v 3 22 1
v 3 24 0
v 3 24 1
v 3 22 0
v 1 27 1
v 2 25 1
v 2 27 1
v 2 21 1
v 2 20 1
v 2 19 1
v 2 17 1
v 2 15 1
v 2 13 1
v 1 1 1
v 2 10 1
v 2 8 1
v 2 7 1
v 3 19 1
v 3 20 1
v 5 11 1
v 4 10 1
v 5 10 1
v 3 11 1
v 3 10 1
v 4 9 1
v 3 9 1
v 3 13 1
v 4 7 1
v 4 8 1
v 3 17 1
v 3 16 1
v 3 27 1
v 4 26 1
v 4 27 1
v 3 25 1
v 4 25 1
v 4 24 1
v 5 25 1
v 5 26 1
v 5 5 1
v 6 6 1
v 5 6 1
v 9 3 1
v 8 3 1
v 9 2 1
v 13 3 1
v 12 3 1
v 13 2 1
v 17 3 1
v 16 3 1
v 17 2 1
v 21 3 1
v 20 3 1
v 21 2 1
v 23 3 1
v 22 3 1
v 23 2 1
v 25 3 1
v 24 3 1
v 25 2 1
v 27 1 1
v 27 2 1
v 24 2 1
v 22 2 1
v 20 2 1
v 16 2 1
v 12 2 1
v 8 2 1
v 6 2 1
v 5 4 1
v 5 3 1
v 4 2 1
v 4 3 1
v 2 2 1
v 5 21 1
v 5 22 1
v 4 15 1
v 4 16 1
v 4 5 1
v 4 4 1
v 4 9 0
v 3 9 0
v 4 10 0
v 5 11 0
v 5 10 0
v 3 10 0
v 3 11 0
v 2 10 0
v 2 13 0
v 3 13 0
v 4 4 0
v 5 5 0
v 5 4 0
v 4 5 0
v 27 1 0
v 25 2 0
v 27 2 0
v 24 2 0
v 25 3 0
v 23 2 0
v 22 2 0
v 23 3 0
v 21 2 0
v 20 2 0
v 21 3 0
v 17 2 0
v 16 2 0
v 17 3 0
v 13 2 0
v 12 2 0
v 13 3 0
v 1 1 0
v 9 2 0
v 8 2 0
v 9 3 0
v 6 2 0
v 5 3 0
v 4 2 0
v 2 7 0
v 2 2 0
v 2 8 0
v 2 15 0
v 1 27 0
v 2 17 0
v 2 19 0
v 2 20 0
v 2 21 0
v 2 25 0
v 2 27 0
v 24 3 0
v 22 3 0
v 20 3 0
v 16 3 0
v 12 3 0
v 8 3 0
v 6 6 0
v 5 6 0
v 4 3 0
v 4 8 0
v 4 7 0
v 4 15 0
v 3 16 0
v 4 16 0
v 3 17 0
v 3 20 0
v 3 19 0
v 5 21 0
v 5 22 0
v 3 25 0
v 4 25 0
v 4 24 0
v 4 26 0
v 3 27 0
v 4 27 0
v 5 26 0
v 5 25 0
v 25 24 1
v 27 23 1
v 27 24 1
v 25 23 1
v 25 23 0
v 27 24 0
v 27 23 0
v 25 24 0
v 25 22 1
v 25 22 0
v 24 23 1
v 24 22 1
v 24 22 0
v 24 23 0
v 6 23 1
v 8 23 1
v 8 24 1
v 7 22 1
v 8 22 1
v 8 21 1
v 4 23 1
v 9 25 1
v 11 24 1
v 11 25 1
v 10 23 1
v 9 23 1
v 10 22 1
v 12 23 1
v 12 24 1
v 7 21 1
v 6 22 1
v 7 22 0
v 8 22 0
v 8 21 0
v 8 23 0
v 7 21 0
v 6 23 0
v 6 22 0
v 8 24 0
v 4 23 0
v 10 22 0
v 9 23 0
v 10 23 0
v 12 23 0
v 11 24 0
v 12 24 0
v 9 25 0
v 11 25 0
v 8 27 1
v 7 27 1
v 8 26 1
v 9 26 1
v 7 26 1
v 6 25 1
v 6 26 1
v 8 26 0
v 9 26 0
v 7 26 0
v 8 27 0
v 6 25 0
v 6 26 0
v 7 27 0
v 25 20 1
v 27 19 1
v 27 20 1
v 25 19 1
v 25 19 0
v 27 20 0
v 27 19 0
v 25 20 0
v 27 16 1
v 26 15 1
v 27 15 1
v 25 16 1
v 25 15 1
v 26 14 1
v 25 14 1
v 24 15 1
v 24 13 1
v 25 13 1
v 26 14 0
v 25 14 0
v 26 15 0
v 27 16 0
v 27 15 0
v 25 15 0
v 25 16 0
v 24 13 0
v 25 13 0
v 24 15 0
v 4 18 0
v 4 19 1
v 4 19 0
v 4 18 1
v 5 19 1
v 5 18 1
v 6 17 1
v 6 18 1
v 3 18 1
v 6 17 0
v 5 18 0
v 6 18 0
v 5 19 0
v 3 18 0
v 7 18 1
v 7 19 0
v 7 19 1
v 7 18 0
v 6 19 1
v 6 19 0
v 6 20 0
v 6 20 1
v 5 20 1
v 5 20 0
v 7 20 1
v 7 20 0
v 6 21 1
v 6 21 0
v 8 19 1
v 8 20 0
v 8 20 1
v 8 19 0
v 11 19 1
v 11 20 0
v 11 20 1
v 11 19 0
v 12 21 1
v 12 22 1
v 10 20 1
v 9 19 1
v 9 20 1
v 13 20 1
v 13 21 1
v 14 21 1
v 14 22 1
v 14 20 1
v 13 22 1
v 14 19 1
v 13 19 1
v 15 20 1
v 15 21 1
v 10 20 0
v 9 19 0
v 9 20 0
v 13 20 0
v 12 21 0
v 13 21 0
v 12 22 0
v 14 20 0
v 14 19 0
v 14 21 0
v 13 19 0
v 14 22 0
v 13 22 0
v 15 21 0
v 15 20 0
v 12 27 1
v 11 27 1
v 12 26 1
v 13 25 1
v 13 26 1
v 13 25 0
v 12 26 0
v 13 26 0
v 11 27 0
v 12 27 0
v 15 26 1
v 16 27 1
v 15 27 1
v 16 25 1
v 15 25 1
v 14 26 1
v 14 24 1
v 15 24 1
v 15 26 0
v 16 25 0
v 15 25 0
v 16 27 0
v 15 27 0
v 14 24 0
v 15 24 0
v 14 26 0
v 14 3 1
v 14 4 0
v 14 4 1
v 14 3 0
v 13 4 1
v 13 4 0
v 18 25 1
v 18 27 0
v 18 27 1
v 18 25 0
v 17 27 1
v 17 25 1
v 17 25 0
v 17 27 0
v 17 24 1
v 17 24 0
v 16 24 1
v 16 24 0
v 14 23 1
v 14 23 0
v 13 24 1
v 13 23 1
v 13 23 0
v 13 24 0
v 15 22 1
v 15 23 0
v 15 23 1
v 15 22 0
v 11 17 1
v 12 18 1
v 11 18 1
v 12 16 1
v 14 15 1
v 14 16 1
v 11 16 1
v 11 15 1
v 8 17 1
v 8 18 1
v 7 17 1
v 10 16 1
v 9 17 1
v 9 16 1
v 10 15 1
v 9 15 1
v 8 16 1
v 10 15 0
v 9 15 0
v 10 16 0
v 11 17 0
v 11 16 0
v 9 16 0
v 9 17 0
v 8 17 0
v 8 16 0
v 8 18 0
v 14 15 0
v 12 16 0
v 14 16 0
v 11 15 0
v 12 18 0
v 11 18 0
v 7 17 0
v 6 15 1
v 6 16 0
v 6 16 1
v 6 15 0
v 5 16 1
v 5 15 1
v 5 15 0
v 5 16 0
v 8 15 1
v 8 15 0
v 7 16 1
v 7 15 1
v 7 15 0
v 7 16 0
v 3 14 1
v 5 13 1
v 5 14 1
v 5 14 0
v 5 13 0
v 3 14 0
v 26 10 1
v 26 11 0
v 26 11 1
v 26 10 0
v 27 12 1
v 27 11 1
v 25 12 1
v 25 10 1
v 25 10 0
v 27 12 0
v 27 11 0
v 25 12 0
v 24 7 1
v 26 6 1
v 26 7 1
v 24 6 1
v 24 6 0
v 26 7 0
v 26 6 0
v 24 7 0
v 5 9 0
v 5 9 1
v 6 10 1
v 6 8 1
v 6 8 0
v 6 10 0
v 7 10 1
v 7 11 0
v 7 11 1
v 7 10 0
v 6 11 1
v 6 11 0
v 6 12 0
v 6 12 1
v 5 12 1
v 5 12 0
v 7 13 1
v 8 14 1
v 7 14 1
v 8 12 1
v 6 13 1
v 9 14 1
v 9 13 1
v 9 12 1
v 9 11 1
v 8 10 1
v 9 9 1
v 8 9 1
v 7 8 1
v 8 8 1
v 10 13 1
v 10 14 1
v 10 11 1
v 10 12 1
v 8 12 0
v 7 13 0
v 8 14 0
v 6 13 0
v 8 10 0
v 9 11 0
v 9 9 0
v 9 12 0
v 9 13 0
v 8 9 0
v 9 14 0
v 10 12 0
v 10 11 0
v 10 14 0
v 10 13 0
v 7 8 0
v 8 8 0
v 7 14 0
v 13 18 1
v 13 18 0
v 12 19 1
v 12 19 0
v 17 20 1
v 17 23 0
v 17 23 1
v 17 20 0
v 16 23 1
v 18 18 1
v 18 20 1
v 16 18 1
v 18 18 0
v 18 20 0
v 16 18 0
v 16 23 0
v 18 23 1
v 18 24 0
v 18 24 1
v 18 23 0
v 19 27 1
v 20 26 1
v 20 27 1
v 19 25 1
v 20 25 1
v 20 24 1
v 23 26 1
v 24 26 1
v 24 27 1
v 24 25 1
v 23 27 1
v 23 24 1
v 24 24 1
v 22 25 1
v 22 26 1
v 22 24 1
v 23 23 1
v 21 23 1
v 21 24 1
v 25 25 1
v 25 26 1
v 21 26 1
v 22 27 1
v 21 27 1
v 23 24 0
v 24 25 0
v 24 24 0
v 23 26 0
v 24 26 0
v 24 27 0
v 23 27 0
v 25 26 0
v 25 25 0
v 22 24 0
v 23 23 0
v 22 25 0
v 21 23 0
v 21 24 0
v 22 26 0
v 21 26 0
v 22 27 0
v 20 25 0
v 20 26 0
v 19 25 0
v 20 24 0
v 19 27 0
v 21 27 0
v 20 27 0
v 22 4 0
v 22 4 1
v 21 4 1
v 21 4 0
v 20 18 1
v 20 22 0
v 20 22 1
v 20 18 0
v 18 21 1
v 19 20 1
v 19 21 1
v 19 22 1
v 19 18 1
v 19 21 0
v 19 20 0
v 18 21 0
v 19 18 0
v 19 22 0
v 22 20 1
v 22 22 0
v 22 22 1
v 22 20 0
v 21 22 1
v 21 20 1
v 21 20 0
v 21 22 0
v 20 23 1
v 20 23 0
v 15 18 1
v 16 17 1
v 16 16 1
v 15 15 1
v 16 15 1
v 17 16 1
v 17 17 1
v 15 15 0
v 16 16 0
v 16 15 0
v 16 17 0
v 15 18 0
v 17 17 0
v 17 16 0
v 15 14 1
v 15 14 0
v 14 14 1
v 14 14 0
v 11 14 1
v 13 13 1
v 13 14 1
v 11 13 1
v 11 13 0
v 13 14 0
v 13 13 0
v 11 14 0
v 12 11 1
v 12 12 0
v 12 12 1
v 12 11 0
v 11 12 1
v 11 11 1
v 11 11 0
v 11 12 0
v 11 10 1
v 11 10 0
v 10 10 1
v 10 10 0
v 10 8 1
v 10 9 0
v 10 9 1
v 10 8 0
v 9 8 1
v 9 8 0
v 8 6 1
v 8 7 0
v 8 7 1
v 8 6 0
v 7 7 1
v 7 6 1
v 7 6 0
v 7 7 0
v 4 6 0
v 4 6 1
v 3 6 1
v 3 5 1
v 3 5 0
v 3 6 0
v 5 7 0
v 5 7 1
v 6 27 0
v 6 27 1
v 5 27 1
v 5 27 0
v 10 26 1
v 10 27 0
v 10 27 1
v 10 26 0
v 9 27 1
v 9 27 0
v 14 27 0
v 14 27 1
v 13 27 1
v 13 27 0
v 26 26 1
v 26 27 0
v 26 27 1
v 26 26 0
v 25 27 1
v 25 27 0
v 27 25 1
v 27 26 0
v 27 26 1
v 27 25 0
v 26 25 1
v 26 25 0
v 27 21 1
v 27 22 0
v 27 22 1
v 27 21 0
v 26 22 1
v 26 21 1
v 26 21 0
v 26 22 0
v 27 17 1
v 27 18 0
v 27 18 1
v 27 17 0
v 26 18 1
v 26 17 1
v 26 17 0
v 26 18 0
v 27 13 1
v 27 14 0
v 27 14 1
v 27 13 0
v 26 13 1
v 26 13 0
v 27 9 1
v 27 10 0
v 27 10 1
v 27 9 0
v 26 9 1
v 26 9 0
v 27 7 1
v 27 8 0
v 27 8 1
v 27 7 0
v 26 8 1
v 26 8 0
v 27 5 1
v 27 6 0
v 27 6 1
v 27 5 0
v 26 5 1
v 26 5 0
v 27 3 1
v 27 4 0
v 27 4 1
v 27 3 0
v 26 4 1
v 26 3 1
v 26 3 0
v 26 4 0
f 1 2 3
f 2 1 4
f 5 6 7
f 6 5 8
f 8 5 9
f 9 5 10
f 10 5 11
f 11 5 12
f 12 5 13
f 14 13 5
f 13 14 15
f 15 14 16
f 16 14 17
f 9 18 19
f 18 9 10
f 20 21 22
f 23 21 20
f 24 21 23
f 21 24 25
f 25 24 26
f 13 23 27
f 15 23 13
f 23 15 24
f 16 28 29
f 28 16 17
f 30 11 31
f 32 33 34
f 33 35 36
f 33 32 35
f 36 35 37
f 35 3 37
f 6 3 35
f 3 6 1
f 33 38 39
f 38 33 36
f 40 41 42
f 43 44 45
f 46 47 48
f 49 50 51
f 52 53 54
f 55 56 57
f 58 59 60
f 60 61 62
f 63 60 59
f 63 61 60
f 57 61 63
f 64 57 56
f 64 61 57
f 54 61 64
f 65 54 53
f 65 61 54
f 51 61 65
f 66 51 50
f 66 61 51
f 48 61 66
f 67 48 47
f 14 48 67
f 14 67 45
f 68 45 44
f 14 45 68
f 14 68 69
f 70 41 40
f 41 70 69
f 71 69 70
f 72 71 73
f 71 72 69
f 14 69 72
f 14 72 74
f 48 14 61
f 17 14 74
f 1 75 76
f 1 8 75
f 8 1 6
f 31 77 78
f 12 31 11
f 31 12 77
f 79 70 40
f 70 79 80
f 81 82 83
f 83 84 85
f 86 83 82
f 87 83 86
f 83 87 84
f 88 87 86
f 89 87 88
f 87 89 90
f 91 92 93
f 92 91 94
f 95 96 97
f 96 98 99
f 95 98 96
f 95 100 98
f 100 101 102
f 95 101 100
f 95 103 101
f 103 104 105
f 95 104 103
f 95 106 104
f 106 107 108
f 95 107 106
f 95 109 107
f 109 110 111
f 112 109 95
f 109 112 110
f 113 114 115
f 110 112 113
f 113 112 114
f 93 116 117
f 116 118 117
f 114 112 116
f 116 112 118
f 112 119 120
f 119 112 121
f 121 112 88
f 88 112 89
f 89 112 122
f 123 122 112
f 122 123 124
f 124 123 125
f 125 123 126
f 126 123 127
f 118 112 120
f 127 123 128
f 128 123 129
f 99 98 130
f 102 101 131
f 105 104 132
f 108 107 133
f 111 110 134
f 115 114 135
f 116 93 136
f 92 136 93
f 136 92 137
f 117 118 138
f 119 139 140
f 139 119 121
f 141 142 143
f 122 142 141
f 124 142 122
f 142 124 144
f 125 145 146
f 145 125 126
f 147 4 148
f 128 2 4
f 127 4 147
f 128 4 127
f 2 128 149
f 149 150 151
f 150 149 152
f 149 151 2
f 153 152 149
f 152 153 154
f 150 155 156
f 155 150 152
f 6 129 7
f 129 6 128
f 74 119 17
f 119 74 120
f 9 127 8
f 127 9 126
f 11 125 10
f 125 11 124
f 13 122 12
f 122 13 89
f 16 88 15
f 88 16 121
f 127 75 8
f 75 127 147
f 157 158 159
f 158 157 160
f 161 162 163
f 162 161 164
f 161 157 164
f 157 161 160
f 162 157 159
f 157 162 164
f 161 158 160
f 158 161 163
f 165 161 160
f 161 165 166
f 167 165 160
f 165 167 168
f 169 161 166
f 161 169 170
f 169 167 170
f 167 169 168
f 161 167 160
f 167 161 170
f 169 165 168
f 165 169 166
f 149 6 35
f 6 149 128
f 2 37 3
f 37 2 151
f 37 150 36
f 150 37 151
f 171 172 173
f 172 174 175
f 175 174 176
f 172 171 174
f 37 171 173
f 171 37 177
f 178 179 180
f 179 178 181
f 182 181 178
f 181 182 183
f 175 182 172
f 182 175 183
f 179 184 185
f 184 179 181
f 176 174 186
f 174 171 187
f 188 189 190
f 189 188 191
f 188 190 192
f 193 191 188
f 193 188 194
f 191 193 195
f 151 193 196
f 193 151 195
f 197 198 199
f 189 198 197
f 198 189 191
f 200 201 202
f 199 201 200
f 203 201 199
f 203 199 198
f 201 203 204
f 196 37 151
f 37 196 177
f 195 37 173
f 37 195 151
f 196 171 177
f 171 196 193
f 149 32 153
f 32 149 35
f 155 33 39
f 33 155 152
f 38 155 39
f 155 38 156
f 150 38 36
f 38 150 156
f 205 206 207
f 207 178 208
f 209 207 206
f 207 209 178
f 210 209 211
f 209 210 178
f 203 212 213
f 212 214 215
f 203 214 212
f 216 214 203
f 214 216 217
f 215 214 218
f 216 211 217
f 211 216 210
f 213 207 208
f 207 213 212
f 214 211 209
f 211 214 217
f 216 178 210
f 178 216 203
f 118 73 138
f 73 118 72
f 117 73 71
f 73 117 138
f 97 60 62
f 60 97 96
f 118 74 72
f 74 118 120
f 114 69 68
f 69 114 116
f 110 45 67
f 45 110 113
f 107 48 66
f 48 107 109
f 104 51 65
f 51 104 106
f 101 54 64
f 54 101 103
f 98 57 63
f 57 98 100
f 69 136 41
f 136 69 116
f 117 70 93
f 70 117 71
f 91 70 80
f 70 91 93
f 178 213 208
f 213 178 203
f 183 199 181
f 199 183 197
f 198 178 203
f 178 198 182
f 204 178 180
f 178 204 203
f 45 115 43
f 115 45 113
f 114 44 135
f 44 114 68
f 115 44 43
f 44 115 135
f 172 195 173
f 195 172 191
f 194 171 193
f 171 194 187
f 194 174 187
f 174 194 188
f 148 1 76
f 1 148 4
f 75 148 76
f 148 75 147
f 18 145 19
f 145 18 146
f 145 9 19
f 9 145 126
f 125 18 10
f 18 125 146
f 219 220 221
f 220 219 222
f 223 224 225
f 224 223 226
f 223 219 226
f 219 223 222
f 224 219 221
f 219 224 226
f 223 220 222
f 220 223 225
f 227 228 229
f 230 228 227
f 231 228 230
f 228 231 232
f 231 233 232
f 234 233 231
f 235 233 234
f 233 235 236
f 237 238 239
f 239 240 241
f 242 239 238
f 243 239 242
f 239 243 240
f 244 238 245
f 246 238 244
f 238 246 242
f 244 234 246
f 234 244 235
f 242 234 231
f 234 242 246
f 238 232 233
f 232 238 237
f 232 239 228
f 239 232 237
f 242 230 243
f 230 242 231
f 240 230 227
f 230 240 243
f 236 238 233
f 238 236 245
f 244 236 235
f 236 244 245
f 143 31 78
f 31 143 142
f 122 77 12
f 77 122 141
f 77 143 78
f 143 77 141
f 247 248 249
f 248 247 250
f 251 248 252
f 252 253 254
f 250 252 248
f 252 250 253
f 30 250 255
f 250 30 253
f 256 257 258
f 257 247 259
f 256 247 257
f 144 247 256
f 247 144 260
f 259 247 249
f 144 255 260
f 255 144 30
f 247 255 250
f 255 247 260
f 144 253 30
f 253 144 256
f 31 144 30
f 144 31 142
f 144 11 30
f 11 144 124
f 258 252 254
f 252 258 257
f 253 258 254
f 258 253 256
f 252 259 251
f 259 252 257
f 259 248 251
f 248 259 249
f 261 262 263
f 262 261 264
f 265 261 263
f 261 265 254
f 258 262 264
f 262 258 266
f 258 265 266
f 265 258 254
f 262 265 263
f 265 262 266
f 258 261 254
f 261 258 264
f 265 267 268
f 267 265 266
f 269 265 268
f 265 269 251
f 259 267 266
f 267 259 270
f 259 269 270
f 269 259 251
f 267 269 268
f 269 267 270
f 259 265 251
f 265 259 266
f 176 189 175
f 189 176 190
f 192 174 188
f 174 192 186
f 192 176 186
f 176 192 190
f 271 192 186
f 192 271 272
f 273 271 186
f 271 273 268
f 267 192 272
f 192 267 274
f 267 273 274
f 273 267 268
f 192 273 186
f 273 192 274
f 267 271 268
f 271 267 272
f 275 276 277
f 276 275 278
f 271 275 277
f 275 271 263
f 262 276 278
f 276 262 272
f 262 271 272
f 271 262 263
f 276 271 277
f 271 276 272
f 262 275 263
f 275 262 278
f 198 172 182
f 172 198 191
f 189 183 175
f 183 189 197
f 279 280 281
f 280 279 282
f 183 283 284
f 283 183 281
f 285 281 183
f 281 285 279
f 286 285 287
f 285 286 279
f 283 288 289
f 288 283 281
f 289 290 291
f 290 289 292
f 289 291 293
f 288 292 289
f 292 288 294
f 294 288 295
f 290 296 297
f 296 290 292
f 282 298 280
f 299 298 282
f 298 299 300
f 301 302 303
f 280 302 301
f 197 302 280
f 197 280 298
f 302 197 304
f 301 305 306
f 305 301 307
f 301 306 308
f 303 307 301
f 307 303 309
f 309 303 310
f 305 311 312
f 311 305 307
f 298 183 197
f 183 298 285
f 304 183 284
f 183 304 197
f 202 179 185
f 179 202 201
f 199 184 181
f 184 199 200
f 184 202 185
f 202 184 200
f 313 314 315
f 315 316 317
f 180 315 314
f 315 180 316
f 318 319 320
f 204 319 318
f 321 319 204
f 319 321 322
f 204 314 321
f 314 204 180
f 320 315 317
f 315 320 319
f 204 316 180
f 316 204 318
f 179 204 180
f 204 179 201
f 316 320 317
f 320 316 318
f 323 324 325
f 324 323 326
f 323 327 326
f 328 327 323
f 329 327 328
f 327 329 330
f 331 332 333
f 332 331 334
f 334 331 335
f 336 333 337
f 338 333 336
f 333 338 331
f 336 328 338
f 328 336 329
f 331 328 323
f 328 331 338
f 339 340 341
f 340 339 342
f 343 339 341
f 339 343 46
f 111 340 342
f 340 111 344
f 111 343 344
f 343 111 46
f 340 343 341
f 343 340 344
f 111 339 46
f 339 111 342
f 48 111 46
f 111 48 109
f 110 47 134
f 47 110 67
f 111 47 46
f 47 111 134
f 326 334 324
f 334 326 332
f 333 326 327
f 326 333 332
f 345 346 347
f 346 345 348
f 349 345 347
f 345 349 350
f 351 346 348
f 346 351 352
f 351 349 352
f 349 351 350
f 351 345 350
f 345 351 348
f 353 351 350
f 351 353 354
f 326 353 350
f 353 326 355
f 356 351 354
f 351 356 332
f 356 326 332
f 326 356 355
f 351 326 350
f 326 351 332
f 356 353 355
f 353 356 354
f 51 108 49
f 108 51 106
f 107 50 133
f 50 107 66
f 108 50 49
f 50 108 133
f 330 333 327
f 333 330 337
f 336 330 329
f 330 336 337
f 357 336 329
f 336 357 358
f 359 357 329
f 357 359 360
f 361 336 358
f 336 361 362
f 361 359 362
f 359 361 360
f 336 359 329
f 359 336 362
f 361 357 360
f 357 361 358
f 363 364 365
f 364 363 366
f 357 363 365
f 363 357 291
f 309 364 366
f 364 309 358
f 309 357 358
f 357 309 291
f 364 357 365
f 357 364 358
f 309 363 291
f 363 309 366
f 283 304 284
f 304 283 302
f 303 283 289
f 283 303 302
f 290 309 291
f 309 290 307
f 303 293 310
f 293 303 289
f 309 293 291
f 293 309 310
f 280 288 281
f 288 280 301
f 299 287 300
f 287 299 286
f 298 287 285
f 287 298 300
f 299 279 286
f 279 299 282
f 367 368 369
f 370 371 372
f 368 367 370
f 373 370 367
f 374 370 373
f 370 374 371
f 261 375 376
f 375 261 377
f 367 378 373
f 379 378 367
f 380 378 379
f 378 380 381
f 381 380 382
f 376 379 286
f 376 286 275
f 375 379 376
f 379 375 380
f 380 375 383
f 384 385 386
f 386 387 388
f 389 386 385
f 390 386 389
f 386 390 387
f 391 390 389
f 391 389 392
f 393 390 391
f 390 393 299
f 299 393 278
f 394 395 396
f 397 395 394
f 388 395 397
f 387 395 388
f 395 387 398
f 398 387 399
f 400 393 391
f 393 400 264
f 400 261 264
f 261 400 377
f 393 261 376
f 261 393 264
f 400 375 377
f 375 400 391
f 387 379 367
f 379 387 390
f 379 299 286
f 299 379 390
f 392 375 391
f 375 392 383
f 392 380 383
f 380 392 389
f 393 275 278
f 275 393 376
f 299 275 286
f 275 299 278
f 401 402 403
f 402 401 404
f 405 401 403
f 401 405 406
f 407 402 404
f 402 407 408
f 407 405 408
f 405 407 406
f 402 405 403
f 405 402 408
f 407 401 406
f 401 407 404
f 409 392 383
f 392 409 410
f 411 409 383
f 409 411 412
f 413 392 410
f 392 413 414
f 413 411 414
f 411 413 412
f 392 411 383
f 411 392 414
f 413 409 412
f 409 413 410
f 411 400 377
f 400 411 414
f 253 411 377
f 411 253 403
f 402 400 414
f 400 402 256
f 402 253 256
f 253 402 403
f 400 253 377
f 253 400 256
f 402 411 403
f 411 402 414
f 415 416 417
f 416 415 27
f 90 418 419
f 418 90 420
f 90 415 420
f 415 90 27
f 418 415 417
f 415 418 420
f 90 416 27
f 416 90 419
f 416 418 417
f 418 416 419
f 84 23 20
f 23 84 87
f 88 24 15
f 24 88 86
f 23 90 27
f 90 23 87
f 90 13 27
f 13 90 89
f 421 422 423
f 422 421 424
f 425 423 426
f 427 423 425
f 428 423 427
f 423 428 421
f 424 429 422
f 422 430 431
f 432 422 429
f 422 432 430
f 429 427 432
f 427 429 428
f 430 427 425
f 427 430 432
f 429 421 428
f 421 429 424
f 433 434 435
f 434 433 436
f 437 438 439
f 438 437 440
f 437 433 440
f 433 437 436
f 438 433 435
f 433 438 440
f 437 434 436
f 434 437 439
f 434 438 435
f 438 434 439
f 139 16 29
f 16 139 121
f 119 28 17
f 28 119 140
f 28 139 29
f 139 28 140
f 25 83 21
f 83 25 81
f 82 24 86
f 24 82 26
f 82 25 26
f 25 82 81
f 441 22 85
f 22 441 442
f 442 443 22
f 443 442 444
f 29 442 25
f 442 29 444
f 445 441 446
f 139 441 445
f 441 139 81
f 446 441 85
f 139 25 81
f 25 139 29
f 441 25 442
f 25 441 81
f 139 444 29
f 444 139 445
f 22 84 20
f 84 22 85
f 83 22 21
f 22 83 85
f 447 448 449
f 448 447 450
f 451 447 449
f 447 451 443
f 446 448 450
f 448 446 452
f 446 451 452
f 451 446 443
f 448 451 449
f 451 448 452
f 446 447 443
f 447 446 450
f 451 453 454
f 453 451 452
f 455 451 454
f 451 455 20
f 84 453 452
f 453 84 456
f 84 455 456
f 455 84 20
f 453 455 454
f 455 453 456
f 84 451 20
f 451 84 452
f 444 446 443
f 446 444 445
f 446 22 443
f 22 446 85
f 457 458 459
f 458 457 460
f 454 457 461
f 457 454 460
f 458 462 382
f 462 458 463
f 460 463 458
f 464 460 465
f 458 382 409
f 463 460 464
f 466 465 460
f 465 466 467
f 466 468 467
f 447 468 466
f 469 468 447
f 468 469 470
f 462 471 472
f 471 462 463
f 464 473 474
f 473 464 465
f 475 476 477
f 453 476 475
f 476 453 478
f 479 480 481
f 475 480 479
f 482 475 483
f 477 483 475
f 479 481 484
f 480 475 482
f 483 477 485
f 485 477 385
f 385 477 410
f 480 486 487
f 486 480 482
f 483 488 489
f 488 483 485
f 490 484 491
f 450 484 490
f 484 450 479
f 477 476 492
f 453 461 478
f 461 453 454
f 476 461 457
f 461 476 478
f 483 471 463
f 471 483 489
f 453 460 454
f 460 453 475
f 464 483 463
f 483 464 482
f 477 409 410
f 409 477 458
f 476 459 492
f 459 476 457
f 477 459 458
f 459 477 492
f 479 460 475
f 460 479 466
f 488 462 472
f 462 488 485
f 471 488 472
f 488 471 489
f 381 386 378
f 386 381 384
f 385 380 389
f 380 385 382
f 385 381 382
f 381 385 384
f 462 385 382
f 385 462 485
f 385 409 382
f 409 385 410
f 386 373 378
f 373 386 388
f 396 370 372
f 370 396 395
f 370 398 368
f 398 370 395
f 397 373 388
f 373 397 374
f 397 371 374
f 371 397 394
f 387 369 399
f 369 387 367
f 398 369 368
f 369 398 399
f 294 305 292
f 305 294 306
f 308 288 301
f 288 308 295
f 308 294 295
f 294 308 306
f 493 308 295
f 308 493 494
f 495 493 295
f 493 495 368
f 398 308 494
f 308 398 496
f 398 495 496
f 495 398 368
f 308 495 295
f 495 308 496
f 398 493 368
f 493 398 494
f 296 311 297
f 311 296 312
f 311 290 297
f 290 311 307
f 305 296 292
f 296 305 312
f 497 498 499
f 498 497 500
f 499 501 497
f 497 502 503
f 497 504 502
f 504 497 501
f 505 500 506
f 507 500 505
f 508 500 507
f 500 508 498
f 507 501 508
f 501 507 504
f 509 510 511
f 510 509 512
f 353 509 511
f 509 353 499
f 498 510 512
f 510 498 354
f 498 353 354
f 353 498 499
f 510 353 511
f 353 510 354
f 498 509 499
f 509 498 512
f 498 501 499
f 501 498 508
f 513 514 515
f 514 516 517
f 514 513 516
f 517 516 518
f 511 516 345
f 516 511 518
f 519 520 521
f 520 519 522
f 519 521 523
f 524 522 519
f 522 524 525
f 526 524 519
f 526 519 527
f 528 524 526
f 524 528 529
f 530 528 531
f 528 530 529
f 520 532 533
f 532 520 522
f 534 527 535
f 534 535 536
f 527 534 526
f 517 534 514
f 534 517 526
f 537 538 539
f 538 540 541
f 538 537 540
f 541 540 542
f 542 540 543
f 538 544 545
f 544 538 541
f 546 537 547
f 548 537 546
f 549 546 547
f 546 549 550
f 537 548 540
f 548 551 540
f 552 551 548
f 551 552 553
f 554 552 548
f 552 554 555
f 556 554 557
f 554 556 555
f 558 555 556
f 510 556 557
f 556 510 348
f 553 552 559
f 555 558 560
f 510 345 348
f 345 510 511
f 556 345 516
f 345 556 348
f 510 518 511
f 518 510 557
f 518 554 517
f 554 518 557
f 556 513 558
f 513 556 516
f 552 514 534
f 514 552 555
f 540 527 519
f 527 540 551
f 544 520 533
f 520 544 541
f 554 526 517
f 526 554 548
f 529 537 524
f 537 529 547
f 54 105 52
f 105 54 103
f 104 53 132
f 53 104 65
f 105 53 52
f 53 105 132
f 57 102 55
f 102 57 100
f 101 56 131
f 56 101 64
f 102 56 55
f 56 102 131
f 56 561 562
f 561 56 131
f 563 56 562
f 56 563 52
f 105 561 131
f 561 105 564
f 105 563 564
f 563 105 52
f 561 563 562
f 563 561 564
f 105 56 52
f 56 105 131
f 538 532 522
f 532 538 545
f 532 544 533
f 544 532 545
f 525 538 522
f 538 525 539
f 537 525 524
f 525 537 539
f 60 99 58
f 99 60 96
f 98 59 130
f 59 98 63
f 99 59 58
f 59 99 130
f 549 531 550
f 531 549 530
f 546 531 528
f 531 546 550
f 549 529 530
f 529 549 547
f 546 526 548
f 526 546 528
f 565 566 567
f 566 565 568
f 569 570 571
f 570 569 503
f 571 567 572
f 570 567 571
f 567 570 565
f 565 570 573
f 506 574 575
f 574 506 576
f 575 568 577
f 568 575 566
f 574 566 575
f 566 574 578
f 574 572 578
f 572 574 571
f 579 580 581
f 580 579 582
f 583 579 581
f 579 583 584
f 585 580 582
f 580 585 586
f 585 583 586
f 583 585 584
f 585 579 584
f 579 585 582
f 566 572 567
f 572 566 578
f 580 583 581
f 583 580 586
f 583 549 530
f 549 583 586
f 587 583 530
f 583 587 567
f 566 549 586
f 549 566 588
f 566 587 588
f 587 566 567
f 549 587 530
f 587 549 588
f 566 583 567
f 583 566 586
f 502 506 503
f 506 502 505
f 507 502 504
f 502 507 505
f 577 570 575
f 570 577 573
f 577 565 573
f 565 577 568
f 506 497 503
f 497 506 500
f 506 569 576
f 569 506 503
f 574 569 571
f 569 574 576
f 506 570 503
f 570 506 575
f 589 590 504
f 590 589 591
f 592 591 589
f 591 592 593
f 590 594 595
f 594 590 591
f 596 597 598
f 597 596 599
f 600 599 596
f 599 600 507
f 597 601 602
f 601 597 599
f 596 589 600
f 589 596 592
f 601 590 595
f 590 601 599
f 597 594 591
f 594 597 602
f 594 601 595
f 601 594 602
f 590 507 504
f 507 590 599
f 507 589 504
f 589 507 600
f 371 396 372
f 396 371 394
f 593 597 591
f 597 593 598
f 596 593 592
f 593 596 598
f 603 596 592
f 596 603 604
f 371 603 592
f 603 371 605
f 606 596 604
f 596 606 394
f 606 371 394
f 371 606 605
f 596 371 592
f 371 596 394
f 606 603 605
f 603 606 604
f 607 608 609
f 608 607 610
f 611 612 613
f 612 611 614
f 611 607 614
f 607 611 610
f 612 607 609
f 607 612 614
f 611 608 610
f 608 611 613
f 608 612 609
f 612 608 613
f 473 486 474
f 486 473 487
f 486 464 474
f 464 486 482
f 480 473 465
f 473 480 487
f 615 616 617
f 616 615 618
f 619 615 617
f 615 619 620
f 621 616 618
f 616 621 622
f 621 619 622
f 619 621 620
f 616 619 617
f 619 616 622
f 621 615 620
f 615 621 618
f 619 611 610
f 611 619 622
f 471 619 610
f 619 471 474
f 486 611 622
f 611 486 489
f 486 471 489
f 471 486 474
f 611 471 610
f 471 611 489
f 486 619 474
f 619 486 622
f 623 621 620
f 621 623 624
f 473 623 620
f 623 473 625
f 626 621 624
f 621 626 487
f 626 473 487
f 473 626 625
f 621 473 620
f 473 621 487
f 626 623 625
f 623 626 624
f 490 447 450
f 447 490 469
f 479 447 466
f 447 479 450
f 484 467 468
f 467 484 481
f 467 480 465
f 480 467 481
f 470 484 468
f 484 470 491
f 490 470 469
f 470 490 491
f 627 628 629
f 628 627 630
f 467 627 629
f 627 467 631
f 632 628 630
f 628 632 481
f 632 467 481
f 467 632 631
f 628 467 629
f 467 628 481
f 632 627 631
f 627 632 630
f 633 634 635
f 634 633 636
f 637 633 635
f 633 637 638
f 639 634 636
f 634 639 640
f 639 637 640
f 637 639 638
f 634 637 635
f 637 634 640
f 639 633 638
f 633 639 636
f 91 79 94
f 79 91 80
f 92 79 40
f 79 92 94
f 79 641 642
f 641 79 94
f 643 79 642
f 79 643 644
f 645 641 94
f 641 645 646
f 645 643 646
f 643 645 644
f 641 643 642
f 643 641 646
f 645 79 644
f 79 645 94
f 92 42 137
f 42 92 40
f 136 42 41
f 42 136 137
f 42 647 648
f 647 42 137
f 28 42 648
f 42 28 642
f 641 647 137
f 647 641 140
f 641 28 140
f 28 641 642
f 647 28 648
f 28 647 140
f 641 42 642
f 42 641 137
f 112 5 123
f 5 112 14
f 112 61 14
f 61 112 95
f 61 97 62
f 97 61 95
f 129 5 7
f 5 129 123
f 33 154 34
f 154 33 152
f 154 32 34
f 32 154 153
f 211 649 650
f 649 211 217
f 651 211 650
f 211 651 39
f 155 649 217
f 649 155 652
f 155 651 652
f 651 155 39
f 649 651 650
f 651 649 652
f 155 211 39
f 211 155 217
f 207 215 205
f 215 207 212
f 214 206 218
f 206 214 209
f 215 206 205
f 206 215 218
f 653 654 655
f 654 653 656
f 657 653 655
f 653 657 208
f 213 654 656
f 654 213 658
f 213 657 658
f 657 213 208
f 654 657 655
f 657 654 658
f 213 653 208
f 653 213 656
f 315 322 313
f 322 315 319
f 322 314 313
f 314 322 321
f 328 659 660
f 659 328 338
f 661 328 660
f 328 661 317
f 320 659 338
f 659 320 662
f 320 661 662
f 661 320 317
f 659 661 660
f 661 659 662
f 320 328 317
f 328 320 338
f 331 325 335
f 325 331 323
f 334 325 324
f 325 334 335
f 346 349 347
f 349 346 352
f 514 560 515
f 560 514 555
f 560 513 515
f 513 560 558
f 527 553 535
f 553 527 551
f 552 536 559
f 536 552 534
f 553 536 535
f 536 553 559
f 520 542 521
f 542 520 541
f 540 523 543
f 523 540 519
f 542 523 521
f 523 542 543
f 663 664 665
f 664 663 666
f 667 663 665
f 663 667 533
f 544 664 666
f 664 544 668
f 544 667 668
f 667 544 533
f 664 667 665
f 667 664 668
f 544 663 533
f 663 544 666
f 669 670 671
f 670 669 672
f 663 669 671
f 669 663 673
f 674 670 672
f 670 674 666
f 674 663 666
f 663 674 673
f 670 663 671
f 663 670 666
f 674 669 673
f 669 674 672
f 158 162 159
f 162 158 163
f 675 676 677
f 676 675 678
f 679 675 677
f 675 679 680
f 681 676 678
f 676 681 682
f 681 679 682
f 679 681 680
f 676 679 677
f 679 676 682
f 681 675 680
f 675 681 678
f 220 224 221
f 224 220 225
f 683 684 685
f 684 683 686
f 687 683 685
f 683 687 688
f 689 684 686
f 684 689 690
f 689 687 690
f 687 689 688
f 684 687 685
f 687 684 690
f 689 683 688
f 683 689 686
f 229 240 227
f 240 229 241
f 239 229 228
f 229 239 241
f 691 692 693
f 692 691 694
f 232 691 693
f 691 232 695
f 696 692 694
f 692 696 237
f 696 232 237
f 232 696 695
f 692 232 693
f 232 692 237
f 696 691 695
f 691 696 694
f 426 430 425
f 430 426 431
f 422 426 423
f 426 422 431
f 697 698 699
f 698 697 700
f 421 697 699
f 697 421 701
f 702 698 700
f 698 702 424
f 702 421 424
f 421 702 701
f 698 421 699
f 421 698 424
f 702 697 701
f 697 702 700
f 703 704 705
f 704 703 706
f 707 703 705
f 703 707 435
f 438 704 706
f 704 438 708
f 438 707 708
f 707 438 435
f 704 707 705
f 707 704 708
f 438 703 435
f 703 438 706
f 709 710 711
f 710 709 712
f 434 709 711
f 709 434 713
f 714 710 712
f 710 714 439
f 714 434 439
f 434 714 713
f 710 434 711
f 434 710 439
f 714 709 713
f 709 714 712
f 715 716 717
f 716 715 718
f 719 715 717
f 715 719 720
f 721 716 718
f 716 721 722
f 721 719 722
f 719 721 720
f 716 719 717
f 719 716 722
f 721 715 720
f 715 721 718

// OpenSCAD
// file: ../../util/bitmap.scad
/*****************************************************************************
 * Module Bitmap Library
 * Modules to create bitmaps of unit squares from 1 or 2 dimensional vectors.
 *****************************************************************************
 * Copyright 2017 Chris Baker
 *
 * This program is free software: you can redistribute it and/or modify
 * it under the terms of the GNU Lesser General Public License as published by
 * the Free Software Foundation, either version 3 of the License, or
 * (at your option) any later version.
 *
 * This program is distributed in the hope that it will be useful,
 * but WITHOUT ANY WARRANTY; without even the implied warranty of
 * MERCHANTABILITY or FITNESS FOR A PARTICULAR PURPOSE.  See the
 * GNU Lesser General Public License for more details.
 *
 * You should have received a copy of the GNU Lesser General Public License
 * along with this program.  If not, see <http://www.gnu.org/licenses/>.
 *****************************************************************************
 * Usage:
 * Include this file with the "use" tag.
 * Depends on compat.scad library.
 *
 * API:
 *   1dbitmap(bitmap, center, expansion, vector_mode)
 *   2dbitmap(bitmap, center, expansion, vector_mode)
 *     Generate a 1 or 2-Dimensional field of modules based on the provided
 *     bitmap vector. See Bitmap Vectors below.
 *     The center flag determines whether to center the bitmap on the origin.
 *     The expansion value actually shrinks each cube in the x and y
 *     dimension by the specified amount.
 *     The vector_mode flag determines whether to create 3D solid geometry
 *     (unit cubes) or 2D vector geometry (squares).
 *
 * Bitmap Vectors:
 *   The bitmap vectors primarily provide boolean information.
 *   A module will be placed where these vectors have a postive value and
 *   skipped where they have a negative value. I.E. 0, -1, false, and undef
 *   are all equivalent and result in a skip. 1 and true are equivalent and
 *   result in a placed 1-unit module.
 *   Further, if the value is an integer it will be treated as a height for
 *   the module, allowing z-maps to be created.
 *   If the value is not an integer or boolean, it will be treated as a color
 *   reference. This can be a string or RGBA vector that will be used to
 *   color the module in the OpenSCAD preview window.
 *   In current versions of OpenSCAD, the color has no effect in the rendered
 *   view or STL output.
 *
 * Vector Mode:
 *   Although OpenSCAD supports generating 2D geometry, there are several
 *   caveats:
 *   - 2D and 3D geometry cannot be mixed
 *   - Extruding 2D geometry causes color information to be lost
 *   - All 2D geometry is projected onto the XY plane when rendering
 *   - Rendering also results in loss of color (same as 3D)
 *   - The SVG exporter is somewhat limited:
 *     - The pixel size of the image is hard-coded in the file
 *     - The title of the image is a generic string
 *     - The color selection for stroke and fill is fixed
 *     - The stroke-width is set to a large value that will cause overlap
 *     - The background is transparent
 *     - Only one path element is created with all of the geometry; there is
 *       no easy way to split up the geometry into multiple logical units.
 *     - These issues can mostly be resolved by hand-editing the file:
 *       - Remove or modify the width and height parameters from the svg
 *         element at the top of the file to provide better scaling.
 *       - Edit the title element at the top of the file to change the title.
 *       - Edit the stroke and fill parameters of the path element (these will
 *         probably be at the end of the file).
 *       - Set the stroke-width parameter for the path element to 0.
 *****************************************************************************/
use <compat.scad>

/*
 * 2dbitmap - Turn a 2D vector into a bitmap of cubes
 *
 * bitmap - 2D vector representing where to place each cube
 *          Value can either be boolean, z-height, or color
 * center - center cubes around the origin
 * expansion - size of gap around each pixel (screendoor)
 * vector_mode - create a 2D vector drawing instead of 3D extrusion
 */
module 2dbitmap(bitmap=[[1,0],[0,1]], center=false, expansion=0, vector_mode=false)
{
	ylen=len(bitmap)-1;

	for (y=[0:ylen]) {
		xlen=len(bitmap[y])-1;
		for (x=[0:xlen])
			translate([x-(center?xlen/2:0),ylen-y-(center?ylen/2:0),0])
				if (is_indexable(bitmap[y][x]))
					color(bitmap[y][x])
						if (vector_mode)
							square([1-expansion,1-expansion], center=center);
						else
							cube([1-expansion,1-expansion,1], center=center);
				else
					if (bitmap[y][x])
						if (vector_mode)
							square([1-expansion,1-expansion], center=center);
						else
							cube([1-expansion,1-expansion,clamp_nonnum(bitmap[y][x])], center=center);
	}
}

module 1dbitmap(bitmap=[1,0,1,0,1], center=false, expansion=0, vector_mode=false)
	2dbitmap([bitmap], center, expansion, vector_mode);

/*
 * Examples
 */

// 1D with z-height
translate([10,0,0]) scale([1,10,1])
	1dbitmap(bitmap=[1,1,0,2,0,0,3], expansion=.1);

// 1D with boolean
translate([-20,0,0]) scale([1,10,1])
	1dbitmap(bitmap=[true,false,true,false,true,true]);

// 2D with z-height
scale([2,2,1])
	2dbitmap(bitmap=[[1,0,2,1],[0,3,3,0],[1,1,0,1]],
		center=true);

// 1D with color
translate([0,-10,0]) scale([1,3,1])
	1dbitmap(bitmap=["red","white","blue",[0,0.3,0,0.5]]);

// 1D with color using 2D-vector-mode
translate([-7,-8,0]) scale([1,2])
	1dbitmap(bitmap=["red",0,"blue",0,"green"], vector_mode=true);
translate([-4.5,-10,0]) scale([1,2])
	1dbitmap(bitmap=["red",0,"blue",0,"green"], vector_mode=true, center=true);
// file: ../../util/bitlib.scad
/*****************************************************************************
 * Bit Manipulation Library
 * Provides some useful bit manipulation functions.
 *****************************************************************************
 * Copyright 2017 Chris Baker
 *
 * This program is free software: you can redistribute it and/or modify
 * it under the terms of the GNU Lesser General Public License as published by
 * the Free Software Foundation, either version 3 of the License, or
 * (at your option) any later version.
 *
 * This program is distributed in the hope that it will be useful,
 * but WITHOUT ANY WARRANTY; without even the implied warranty of
 * MERCHANTABILITY or FITNESS FOR A PARTICULAR PURPOSE.  See the
 * GNU Lesser General Public License for more details.
 *
 * You should have received a copy of the GNU Lesser General Public License
 * along with this program.  If not, see <http://www.gnu.org/licenses/>.
 *****************************************************************************
 * Usage:
 * Include this file with the "use" tag.
 * When run on its own, all echo statements in this
 * library should print "true".
 *
 * API:
 *   bit(v,b)
 *     Return the truth value of the b'th bit of v.
 *
 *   check_bit_size(v,b,signed=false)
 *     Determine whether the value v can be represented
 *     with b bits (b must be positive).
 *     The signed flag indicates whether to include the
 *     sign bit in the determination; otherwise negative
 *     values will result in undef being returned.
 *
 *   xor(a,b)
 *     Return the value of a xor b.
 *     Handles arbitrary size values for a and b.
 *     Handles negative values as expected (a positive
 *     result will be returned unless a and b have
 *     differing signs).
 *
 * TODO:
 *  - Change echos to asserts (future OpenSCAD version)
 *  - Add more functions
 *
 *****************************************************************************/

//Return the truth value of the b'th bit of v
function bit(v,b) =
	((v==undef)||(b==undef)||(b<0))?undef:
	(floor(v / pow(2, b)) % 2)?true:false;

echo("*** bit() testcases ***");
echo(0,bit(0,0)==false);
echo(1,bit(-1,0)==true);
echo(2,bit(1,0)==true);
echo(3,[for (i=[0:63]) bit(0,i)]==[for (i=[0:63]) false]); //0=0...0
echo(4,[for (i=[0:63]) bit(-1,i)]==[for (i=[0:63]) true]); //-1=1...1
echo(5,[for (i=[1:63]) bit(1,i)]==[for (i=[1:63]) false]); //1=0...01
echo(6,[for (i=[0:7]) bit(85,i)?1:0]==[1,0,1,0,1,0,1,0]); //85=01010101
echo(7,[for (i=[0:7]) bit(170,i)?1:0]==[0,1,0,1,0,1,0,1]); //170=10101010
echo(8,[for (i=[0:7]) bit(165,i)?1:0]==[1,0,1,0,0,1,0,1]); //165=10100101
echo(9,[for (i=[0:7]) bit(56,i)?1:0]==[0,0,0,1,1,1,0,0]); //56=00111000
echo(10,[for (i=[0:7]) bit(-3,i)?1:0]==[1,0,1,1,1,1,1,1]); //-3=1...101
//(2^64)=0...01 0...0
echo(11,bit(pow(2,64),64)==true);
echo(12,[for (i=[0:63]) bit(pow(2,64),i)]==[for (i=[0:63]) false]);
echo(13,[for (i=[65:127]) bit(pow(2,64),i)]==[for (i=[1:63]) false]);
//-(2^64)=1...1 0...0
echo(14,[for (i=[0:63]) bit(-pow(2,64),i)]==[for (i=[0:63]) false]);
echo(15,[for (i=[64:127]) bit(-pow(2,64),i)]==[for (i=[0:63]) true]);
echo(16,bit(10,-1)==undef);
echo(17,bit(10,undef)==undef);
echo(18,bit(undef,3)==undef);

//return true if v can be represented in b bits
//if signed flag is set. the result will be adjusted
//to account for the needed sign bit
function check_bit_size(v,b,signed=false) =
	(b<0)?undef:
	(v==undef)?undef:
	(b==0)?false:
	(v==0)?true: //(b>0)
	(signed)?
		(v<0)?(-pow(2,b-1)<(v+1)):
			(pow(2,b-1)>(v+1)):
		(v<0)?undef:
			(pow(2,b)>v);

echo("*** check_bit_size() testcases ***");
echo(0,check_bit_size(-1,2)==undef);
echo(1,check_bit_size(2,-4)==undef);
echo(2,check_bit_size(2,-4,signed=true)==undef);
echo(3,check_bit_size(0,0)==false);
echo(4,check_bit_size(0,1)==true);
echo(5,check_bit_size(1,0)==false);
echo(6,check_bit_size(1,1)==true);
echo(7,check_bit_size(7,3)==true);
echo(8,check_bit_size(8,3)==false);
echo(9,check_bit_size(1,3)==true);
echo(10,check_bit_size(256,8)==false);
echo(11,check_bit_size(255,8)==true);
echo(12,check_bit_size(10,2)==false);
echo(13,check_bit_size(10,4)==true);
echo(14,check_bit_size(-10,2,signed=true)==false);
echo(15,check_bit_size(-10,4,signed=true)==false);
echo(16,check_bit_size(-10,5,signed=true)==true);
echo(17,check_bit_size(-1,0,signed=true)==false);
echo(18,check_bit_size(-1,1,signed=true)==true);
echo(19,check_bit_size(0,0,signed=true)==false);
echo(20,check_bit_size(0,1,signed=true)==true);
echo(21,check_bit_size(-2,2,signed=true)==true);
echo(22,check_bit_size(-3,2,signed=true)==false);
echo(23,check_bit_size(-3,3,signed=true)==true);
echo(24,check_bit_size(-8,3,signed=true)==false);
echo(25,check_bit_size(-8,4,signed=true)==true);
echo(26,check_bit_size(undef,4)==undef);
echo(27,check_bit_size(undef,4,signed=true)==undef);

//return the value of a xor b
//runs recursively until all bits of a and b are exhausted
function xor(a,b,i=0) =
	((a==undef)||(b==undef))?undef:
	let (c=bit(a,i), d=bit(b,i),
		 v=((c||d) && !(c&&d))?pow(2,i):0)
		(check_bit_size(a,i,signed=true) &&
		 check_bit_size(b,i,signed=true))?
			-v: //special case for sign bit
			v+xor(a,b,i+1); //recursively add powers of 2

echo("*** xor() testcases ***");
echo(0,xor(42,0)==42);
echo(1,xor(42,42)==0);
echo(2,xor(169,238)==71); //10101001^11101110=01000111=71
echo(3,xor(238,169)==71);
echo(4,xor(42,238)==196); //00101010^11101110=11000100=196
echo(5,xor(169,42)==131); //10101001^00101010=10000011=131
echo(6,xor(-8,-10)==14); //11000^10110=01110=14
echo(7,xor(-7,-10)==15); //11001^10110=01111=15
echo(8,xor(9,-10)==-1); //01001^10110=11111=-1
echo(9,xor(9,-12)==-3); //01001^10100=11101=-3
echo(10,xor(undef,0)==undef);
// file: ../../util/stringlib.scad
/*****************************************************************************
 * String Manipulation Library
 * Provides some useful string manipulation functions.
 *****************************************************************************
 * Copyright 2017 Chris Baker
 *
 * This program is free software: you can redistribute it and/or modify
 * it under the terms of the GNU Lesser General Public License as published by
 * the Free Software Foundation, either version 3 of the License, or
 * (at your option) any later version.
 *
 * This program is distributed in the hope that it will be useful,
 * but WITHOUT ANY WARRANTY; without even the implied warranty of
 * MERCHANTABILITY or FITNESS FOR A PARTICULAR PURPOSE.  See the
 * GNU Lesser General Public License for more details.
 *
 * You should have received a copy of the GNU Lesser General Public License
 * along with this program.  If not, see <http://www.gnu.org/licenses/>.
 *****************************************************************************
 * Usage:
 * Include this file with the "use" tag.
 * When run on its own, all echo statements in this library should print
 * "true".
 *
 * API:
 *   atoi(a)
 *     Convert the string of numerals, a, to a vector of individual decimal
 *     numbers.
 *
 *   ascii_to_vec(a)
 *     Convert the ASCII string, a, into a vector of decimal numbers.
 *
 * TODO:
 *  - Change echos to asserts (future OpenSCAD version)
 *
 *****************************************************************************/

/*
 * atoi - convert ASCII numerals to a vector of individual decimal numbers
 *
 * a - the ASCII string of numerals
 */
function atoi(a) = (len(a)==undef)?undef:
[
	let (val = search(a, "0123456789"))
		for (i = val) i
];

echo("*** atoi() testcases ***");
echo(ascii_to_vec(undef)==undef);
echo(ascii_to_vec(true)==undef);
echo(ascii_to_vec(false)==undef);
echo(ascii_to_vec("")==[]);
echo(atoi("0")==[0]);
echo(atoi("1")==[1]);
echo(atoi("2")==[2]);
echo(atoi("3")==[3]);
echo(atoi("4")==[4]);
echo(atoi("5")==[5]);
echo(atoi("6")==[6]);
echo(atoi("7")==[7]);
echo(atoi("8")==[8]);
echo(atoi("9")==[9]);
echo(atoi("123")==[1,2,3]);
echo(atoi("1a23b")==[1,2,3]); //degenerate case, don't really care too much about the result

/*
 * ascii_to_vec - convert ASCII string to decimal vector
 *
 * a - the ASCII string to vectorize
 */
function ascii_to_vec(a) = (len(a)==undef)?undef:
[
	let (val = search(a, "\x01\x02\x03\x04\x05\x06\x07\x08\x09\x0a\x0b\x0c\x0d\x0e\x0f\x10\x11\x12\x13\x14\x15\x16\x17\x18\x19\x1a\x1b\x1c\x1d\x1e\x1f !\"#$%&'()*+,-./0123456789:;<=>?@ABCDEFGHIJKLMNOPQRSTUVWXYZ[\\]^_`abcdefghijklmnopqrstuvwxyz{|}~\x7f"))
		for (i = val) i+1
];

echo("*** ascii_to_vec() testcases ***");
echo(ascii_to_vec(undef)==undef);
echo(ascii_to_vec(true)==undef);
echo(ascii_to_vec(false)==undef);
echo(ascii_to_vec("")==[]);
echo(ascii_to_vec("0")==[48]);
echo(ascii_to_vec("a")==[97]);
echo(ascii_to_vec("0123456789")==[48,49,50,51,52,53,54,55,56,57]);
echo(ascii_to_vec("The quick brown fox jumped over the lazy dog.")
	==[84,104,101,32,113,117,105,99,107,32,98,114,111,119,110,32,102,111,120,32,106,117,109,112,101,100,32,111,118,101,114,32,116,104,101,32,108,97,122,121,32,100,111,103,46]);
// main file
/* Unit Test 13: 26x26 - 44 data bytes, 28 ecc bytes */
use <../datamatrix.scad>
data_matrix(dm_ascii("http://semapedia.org/v/Mixer_(consolle)/it"),
	mark="black");
